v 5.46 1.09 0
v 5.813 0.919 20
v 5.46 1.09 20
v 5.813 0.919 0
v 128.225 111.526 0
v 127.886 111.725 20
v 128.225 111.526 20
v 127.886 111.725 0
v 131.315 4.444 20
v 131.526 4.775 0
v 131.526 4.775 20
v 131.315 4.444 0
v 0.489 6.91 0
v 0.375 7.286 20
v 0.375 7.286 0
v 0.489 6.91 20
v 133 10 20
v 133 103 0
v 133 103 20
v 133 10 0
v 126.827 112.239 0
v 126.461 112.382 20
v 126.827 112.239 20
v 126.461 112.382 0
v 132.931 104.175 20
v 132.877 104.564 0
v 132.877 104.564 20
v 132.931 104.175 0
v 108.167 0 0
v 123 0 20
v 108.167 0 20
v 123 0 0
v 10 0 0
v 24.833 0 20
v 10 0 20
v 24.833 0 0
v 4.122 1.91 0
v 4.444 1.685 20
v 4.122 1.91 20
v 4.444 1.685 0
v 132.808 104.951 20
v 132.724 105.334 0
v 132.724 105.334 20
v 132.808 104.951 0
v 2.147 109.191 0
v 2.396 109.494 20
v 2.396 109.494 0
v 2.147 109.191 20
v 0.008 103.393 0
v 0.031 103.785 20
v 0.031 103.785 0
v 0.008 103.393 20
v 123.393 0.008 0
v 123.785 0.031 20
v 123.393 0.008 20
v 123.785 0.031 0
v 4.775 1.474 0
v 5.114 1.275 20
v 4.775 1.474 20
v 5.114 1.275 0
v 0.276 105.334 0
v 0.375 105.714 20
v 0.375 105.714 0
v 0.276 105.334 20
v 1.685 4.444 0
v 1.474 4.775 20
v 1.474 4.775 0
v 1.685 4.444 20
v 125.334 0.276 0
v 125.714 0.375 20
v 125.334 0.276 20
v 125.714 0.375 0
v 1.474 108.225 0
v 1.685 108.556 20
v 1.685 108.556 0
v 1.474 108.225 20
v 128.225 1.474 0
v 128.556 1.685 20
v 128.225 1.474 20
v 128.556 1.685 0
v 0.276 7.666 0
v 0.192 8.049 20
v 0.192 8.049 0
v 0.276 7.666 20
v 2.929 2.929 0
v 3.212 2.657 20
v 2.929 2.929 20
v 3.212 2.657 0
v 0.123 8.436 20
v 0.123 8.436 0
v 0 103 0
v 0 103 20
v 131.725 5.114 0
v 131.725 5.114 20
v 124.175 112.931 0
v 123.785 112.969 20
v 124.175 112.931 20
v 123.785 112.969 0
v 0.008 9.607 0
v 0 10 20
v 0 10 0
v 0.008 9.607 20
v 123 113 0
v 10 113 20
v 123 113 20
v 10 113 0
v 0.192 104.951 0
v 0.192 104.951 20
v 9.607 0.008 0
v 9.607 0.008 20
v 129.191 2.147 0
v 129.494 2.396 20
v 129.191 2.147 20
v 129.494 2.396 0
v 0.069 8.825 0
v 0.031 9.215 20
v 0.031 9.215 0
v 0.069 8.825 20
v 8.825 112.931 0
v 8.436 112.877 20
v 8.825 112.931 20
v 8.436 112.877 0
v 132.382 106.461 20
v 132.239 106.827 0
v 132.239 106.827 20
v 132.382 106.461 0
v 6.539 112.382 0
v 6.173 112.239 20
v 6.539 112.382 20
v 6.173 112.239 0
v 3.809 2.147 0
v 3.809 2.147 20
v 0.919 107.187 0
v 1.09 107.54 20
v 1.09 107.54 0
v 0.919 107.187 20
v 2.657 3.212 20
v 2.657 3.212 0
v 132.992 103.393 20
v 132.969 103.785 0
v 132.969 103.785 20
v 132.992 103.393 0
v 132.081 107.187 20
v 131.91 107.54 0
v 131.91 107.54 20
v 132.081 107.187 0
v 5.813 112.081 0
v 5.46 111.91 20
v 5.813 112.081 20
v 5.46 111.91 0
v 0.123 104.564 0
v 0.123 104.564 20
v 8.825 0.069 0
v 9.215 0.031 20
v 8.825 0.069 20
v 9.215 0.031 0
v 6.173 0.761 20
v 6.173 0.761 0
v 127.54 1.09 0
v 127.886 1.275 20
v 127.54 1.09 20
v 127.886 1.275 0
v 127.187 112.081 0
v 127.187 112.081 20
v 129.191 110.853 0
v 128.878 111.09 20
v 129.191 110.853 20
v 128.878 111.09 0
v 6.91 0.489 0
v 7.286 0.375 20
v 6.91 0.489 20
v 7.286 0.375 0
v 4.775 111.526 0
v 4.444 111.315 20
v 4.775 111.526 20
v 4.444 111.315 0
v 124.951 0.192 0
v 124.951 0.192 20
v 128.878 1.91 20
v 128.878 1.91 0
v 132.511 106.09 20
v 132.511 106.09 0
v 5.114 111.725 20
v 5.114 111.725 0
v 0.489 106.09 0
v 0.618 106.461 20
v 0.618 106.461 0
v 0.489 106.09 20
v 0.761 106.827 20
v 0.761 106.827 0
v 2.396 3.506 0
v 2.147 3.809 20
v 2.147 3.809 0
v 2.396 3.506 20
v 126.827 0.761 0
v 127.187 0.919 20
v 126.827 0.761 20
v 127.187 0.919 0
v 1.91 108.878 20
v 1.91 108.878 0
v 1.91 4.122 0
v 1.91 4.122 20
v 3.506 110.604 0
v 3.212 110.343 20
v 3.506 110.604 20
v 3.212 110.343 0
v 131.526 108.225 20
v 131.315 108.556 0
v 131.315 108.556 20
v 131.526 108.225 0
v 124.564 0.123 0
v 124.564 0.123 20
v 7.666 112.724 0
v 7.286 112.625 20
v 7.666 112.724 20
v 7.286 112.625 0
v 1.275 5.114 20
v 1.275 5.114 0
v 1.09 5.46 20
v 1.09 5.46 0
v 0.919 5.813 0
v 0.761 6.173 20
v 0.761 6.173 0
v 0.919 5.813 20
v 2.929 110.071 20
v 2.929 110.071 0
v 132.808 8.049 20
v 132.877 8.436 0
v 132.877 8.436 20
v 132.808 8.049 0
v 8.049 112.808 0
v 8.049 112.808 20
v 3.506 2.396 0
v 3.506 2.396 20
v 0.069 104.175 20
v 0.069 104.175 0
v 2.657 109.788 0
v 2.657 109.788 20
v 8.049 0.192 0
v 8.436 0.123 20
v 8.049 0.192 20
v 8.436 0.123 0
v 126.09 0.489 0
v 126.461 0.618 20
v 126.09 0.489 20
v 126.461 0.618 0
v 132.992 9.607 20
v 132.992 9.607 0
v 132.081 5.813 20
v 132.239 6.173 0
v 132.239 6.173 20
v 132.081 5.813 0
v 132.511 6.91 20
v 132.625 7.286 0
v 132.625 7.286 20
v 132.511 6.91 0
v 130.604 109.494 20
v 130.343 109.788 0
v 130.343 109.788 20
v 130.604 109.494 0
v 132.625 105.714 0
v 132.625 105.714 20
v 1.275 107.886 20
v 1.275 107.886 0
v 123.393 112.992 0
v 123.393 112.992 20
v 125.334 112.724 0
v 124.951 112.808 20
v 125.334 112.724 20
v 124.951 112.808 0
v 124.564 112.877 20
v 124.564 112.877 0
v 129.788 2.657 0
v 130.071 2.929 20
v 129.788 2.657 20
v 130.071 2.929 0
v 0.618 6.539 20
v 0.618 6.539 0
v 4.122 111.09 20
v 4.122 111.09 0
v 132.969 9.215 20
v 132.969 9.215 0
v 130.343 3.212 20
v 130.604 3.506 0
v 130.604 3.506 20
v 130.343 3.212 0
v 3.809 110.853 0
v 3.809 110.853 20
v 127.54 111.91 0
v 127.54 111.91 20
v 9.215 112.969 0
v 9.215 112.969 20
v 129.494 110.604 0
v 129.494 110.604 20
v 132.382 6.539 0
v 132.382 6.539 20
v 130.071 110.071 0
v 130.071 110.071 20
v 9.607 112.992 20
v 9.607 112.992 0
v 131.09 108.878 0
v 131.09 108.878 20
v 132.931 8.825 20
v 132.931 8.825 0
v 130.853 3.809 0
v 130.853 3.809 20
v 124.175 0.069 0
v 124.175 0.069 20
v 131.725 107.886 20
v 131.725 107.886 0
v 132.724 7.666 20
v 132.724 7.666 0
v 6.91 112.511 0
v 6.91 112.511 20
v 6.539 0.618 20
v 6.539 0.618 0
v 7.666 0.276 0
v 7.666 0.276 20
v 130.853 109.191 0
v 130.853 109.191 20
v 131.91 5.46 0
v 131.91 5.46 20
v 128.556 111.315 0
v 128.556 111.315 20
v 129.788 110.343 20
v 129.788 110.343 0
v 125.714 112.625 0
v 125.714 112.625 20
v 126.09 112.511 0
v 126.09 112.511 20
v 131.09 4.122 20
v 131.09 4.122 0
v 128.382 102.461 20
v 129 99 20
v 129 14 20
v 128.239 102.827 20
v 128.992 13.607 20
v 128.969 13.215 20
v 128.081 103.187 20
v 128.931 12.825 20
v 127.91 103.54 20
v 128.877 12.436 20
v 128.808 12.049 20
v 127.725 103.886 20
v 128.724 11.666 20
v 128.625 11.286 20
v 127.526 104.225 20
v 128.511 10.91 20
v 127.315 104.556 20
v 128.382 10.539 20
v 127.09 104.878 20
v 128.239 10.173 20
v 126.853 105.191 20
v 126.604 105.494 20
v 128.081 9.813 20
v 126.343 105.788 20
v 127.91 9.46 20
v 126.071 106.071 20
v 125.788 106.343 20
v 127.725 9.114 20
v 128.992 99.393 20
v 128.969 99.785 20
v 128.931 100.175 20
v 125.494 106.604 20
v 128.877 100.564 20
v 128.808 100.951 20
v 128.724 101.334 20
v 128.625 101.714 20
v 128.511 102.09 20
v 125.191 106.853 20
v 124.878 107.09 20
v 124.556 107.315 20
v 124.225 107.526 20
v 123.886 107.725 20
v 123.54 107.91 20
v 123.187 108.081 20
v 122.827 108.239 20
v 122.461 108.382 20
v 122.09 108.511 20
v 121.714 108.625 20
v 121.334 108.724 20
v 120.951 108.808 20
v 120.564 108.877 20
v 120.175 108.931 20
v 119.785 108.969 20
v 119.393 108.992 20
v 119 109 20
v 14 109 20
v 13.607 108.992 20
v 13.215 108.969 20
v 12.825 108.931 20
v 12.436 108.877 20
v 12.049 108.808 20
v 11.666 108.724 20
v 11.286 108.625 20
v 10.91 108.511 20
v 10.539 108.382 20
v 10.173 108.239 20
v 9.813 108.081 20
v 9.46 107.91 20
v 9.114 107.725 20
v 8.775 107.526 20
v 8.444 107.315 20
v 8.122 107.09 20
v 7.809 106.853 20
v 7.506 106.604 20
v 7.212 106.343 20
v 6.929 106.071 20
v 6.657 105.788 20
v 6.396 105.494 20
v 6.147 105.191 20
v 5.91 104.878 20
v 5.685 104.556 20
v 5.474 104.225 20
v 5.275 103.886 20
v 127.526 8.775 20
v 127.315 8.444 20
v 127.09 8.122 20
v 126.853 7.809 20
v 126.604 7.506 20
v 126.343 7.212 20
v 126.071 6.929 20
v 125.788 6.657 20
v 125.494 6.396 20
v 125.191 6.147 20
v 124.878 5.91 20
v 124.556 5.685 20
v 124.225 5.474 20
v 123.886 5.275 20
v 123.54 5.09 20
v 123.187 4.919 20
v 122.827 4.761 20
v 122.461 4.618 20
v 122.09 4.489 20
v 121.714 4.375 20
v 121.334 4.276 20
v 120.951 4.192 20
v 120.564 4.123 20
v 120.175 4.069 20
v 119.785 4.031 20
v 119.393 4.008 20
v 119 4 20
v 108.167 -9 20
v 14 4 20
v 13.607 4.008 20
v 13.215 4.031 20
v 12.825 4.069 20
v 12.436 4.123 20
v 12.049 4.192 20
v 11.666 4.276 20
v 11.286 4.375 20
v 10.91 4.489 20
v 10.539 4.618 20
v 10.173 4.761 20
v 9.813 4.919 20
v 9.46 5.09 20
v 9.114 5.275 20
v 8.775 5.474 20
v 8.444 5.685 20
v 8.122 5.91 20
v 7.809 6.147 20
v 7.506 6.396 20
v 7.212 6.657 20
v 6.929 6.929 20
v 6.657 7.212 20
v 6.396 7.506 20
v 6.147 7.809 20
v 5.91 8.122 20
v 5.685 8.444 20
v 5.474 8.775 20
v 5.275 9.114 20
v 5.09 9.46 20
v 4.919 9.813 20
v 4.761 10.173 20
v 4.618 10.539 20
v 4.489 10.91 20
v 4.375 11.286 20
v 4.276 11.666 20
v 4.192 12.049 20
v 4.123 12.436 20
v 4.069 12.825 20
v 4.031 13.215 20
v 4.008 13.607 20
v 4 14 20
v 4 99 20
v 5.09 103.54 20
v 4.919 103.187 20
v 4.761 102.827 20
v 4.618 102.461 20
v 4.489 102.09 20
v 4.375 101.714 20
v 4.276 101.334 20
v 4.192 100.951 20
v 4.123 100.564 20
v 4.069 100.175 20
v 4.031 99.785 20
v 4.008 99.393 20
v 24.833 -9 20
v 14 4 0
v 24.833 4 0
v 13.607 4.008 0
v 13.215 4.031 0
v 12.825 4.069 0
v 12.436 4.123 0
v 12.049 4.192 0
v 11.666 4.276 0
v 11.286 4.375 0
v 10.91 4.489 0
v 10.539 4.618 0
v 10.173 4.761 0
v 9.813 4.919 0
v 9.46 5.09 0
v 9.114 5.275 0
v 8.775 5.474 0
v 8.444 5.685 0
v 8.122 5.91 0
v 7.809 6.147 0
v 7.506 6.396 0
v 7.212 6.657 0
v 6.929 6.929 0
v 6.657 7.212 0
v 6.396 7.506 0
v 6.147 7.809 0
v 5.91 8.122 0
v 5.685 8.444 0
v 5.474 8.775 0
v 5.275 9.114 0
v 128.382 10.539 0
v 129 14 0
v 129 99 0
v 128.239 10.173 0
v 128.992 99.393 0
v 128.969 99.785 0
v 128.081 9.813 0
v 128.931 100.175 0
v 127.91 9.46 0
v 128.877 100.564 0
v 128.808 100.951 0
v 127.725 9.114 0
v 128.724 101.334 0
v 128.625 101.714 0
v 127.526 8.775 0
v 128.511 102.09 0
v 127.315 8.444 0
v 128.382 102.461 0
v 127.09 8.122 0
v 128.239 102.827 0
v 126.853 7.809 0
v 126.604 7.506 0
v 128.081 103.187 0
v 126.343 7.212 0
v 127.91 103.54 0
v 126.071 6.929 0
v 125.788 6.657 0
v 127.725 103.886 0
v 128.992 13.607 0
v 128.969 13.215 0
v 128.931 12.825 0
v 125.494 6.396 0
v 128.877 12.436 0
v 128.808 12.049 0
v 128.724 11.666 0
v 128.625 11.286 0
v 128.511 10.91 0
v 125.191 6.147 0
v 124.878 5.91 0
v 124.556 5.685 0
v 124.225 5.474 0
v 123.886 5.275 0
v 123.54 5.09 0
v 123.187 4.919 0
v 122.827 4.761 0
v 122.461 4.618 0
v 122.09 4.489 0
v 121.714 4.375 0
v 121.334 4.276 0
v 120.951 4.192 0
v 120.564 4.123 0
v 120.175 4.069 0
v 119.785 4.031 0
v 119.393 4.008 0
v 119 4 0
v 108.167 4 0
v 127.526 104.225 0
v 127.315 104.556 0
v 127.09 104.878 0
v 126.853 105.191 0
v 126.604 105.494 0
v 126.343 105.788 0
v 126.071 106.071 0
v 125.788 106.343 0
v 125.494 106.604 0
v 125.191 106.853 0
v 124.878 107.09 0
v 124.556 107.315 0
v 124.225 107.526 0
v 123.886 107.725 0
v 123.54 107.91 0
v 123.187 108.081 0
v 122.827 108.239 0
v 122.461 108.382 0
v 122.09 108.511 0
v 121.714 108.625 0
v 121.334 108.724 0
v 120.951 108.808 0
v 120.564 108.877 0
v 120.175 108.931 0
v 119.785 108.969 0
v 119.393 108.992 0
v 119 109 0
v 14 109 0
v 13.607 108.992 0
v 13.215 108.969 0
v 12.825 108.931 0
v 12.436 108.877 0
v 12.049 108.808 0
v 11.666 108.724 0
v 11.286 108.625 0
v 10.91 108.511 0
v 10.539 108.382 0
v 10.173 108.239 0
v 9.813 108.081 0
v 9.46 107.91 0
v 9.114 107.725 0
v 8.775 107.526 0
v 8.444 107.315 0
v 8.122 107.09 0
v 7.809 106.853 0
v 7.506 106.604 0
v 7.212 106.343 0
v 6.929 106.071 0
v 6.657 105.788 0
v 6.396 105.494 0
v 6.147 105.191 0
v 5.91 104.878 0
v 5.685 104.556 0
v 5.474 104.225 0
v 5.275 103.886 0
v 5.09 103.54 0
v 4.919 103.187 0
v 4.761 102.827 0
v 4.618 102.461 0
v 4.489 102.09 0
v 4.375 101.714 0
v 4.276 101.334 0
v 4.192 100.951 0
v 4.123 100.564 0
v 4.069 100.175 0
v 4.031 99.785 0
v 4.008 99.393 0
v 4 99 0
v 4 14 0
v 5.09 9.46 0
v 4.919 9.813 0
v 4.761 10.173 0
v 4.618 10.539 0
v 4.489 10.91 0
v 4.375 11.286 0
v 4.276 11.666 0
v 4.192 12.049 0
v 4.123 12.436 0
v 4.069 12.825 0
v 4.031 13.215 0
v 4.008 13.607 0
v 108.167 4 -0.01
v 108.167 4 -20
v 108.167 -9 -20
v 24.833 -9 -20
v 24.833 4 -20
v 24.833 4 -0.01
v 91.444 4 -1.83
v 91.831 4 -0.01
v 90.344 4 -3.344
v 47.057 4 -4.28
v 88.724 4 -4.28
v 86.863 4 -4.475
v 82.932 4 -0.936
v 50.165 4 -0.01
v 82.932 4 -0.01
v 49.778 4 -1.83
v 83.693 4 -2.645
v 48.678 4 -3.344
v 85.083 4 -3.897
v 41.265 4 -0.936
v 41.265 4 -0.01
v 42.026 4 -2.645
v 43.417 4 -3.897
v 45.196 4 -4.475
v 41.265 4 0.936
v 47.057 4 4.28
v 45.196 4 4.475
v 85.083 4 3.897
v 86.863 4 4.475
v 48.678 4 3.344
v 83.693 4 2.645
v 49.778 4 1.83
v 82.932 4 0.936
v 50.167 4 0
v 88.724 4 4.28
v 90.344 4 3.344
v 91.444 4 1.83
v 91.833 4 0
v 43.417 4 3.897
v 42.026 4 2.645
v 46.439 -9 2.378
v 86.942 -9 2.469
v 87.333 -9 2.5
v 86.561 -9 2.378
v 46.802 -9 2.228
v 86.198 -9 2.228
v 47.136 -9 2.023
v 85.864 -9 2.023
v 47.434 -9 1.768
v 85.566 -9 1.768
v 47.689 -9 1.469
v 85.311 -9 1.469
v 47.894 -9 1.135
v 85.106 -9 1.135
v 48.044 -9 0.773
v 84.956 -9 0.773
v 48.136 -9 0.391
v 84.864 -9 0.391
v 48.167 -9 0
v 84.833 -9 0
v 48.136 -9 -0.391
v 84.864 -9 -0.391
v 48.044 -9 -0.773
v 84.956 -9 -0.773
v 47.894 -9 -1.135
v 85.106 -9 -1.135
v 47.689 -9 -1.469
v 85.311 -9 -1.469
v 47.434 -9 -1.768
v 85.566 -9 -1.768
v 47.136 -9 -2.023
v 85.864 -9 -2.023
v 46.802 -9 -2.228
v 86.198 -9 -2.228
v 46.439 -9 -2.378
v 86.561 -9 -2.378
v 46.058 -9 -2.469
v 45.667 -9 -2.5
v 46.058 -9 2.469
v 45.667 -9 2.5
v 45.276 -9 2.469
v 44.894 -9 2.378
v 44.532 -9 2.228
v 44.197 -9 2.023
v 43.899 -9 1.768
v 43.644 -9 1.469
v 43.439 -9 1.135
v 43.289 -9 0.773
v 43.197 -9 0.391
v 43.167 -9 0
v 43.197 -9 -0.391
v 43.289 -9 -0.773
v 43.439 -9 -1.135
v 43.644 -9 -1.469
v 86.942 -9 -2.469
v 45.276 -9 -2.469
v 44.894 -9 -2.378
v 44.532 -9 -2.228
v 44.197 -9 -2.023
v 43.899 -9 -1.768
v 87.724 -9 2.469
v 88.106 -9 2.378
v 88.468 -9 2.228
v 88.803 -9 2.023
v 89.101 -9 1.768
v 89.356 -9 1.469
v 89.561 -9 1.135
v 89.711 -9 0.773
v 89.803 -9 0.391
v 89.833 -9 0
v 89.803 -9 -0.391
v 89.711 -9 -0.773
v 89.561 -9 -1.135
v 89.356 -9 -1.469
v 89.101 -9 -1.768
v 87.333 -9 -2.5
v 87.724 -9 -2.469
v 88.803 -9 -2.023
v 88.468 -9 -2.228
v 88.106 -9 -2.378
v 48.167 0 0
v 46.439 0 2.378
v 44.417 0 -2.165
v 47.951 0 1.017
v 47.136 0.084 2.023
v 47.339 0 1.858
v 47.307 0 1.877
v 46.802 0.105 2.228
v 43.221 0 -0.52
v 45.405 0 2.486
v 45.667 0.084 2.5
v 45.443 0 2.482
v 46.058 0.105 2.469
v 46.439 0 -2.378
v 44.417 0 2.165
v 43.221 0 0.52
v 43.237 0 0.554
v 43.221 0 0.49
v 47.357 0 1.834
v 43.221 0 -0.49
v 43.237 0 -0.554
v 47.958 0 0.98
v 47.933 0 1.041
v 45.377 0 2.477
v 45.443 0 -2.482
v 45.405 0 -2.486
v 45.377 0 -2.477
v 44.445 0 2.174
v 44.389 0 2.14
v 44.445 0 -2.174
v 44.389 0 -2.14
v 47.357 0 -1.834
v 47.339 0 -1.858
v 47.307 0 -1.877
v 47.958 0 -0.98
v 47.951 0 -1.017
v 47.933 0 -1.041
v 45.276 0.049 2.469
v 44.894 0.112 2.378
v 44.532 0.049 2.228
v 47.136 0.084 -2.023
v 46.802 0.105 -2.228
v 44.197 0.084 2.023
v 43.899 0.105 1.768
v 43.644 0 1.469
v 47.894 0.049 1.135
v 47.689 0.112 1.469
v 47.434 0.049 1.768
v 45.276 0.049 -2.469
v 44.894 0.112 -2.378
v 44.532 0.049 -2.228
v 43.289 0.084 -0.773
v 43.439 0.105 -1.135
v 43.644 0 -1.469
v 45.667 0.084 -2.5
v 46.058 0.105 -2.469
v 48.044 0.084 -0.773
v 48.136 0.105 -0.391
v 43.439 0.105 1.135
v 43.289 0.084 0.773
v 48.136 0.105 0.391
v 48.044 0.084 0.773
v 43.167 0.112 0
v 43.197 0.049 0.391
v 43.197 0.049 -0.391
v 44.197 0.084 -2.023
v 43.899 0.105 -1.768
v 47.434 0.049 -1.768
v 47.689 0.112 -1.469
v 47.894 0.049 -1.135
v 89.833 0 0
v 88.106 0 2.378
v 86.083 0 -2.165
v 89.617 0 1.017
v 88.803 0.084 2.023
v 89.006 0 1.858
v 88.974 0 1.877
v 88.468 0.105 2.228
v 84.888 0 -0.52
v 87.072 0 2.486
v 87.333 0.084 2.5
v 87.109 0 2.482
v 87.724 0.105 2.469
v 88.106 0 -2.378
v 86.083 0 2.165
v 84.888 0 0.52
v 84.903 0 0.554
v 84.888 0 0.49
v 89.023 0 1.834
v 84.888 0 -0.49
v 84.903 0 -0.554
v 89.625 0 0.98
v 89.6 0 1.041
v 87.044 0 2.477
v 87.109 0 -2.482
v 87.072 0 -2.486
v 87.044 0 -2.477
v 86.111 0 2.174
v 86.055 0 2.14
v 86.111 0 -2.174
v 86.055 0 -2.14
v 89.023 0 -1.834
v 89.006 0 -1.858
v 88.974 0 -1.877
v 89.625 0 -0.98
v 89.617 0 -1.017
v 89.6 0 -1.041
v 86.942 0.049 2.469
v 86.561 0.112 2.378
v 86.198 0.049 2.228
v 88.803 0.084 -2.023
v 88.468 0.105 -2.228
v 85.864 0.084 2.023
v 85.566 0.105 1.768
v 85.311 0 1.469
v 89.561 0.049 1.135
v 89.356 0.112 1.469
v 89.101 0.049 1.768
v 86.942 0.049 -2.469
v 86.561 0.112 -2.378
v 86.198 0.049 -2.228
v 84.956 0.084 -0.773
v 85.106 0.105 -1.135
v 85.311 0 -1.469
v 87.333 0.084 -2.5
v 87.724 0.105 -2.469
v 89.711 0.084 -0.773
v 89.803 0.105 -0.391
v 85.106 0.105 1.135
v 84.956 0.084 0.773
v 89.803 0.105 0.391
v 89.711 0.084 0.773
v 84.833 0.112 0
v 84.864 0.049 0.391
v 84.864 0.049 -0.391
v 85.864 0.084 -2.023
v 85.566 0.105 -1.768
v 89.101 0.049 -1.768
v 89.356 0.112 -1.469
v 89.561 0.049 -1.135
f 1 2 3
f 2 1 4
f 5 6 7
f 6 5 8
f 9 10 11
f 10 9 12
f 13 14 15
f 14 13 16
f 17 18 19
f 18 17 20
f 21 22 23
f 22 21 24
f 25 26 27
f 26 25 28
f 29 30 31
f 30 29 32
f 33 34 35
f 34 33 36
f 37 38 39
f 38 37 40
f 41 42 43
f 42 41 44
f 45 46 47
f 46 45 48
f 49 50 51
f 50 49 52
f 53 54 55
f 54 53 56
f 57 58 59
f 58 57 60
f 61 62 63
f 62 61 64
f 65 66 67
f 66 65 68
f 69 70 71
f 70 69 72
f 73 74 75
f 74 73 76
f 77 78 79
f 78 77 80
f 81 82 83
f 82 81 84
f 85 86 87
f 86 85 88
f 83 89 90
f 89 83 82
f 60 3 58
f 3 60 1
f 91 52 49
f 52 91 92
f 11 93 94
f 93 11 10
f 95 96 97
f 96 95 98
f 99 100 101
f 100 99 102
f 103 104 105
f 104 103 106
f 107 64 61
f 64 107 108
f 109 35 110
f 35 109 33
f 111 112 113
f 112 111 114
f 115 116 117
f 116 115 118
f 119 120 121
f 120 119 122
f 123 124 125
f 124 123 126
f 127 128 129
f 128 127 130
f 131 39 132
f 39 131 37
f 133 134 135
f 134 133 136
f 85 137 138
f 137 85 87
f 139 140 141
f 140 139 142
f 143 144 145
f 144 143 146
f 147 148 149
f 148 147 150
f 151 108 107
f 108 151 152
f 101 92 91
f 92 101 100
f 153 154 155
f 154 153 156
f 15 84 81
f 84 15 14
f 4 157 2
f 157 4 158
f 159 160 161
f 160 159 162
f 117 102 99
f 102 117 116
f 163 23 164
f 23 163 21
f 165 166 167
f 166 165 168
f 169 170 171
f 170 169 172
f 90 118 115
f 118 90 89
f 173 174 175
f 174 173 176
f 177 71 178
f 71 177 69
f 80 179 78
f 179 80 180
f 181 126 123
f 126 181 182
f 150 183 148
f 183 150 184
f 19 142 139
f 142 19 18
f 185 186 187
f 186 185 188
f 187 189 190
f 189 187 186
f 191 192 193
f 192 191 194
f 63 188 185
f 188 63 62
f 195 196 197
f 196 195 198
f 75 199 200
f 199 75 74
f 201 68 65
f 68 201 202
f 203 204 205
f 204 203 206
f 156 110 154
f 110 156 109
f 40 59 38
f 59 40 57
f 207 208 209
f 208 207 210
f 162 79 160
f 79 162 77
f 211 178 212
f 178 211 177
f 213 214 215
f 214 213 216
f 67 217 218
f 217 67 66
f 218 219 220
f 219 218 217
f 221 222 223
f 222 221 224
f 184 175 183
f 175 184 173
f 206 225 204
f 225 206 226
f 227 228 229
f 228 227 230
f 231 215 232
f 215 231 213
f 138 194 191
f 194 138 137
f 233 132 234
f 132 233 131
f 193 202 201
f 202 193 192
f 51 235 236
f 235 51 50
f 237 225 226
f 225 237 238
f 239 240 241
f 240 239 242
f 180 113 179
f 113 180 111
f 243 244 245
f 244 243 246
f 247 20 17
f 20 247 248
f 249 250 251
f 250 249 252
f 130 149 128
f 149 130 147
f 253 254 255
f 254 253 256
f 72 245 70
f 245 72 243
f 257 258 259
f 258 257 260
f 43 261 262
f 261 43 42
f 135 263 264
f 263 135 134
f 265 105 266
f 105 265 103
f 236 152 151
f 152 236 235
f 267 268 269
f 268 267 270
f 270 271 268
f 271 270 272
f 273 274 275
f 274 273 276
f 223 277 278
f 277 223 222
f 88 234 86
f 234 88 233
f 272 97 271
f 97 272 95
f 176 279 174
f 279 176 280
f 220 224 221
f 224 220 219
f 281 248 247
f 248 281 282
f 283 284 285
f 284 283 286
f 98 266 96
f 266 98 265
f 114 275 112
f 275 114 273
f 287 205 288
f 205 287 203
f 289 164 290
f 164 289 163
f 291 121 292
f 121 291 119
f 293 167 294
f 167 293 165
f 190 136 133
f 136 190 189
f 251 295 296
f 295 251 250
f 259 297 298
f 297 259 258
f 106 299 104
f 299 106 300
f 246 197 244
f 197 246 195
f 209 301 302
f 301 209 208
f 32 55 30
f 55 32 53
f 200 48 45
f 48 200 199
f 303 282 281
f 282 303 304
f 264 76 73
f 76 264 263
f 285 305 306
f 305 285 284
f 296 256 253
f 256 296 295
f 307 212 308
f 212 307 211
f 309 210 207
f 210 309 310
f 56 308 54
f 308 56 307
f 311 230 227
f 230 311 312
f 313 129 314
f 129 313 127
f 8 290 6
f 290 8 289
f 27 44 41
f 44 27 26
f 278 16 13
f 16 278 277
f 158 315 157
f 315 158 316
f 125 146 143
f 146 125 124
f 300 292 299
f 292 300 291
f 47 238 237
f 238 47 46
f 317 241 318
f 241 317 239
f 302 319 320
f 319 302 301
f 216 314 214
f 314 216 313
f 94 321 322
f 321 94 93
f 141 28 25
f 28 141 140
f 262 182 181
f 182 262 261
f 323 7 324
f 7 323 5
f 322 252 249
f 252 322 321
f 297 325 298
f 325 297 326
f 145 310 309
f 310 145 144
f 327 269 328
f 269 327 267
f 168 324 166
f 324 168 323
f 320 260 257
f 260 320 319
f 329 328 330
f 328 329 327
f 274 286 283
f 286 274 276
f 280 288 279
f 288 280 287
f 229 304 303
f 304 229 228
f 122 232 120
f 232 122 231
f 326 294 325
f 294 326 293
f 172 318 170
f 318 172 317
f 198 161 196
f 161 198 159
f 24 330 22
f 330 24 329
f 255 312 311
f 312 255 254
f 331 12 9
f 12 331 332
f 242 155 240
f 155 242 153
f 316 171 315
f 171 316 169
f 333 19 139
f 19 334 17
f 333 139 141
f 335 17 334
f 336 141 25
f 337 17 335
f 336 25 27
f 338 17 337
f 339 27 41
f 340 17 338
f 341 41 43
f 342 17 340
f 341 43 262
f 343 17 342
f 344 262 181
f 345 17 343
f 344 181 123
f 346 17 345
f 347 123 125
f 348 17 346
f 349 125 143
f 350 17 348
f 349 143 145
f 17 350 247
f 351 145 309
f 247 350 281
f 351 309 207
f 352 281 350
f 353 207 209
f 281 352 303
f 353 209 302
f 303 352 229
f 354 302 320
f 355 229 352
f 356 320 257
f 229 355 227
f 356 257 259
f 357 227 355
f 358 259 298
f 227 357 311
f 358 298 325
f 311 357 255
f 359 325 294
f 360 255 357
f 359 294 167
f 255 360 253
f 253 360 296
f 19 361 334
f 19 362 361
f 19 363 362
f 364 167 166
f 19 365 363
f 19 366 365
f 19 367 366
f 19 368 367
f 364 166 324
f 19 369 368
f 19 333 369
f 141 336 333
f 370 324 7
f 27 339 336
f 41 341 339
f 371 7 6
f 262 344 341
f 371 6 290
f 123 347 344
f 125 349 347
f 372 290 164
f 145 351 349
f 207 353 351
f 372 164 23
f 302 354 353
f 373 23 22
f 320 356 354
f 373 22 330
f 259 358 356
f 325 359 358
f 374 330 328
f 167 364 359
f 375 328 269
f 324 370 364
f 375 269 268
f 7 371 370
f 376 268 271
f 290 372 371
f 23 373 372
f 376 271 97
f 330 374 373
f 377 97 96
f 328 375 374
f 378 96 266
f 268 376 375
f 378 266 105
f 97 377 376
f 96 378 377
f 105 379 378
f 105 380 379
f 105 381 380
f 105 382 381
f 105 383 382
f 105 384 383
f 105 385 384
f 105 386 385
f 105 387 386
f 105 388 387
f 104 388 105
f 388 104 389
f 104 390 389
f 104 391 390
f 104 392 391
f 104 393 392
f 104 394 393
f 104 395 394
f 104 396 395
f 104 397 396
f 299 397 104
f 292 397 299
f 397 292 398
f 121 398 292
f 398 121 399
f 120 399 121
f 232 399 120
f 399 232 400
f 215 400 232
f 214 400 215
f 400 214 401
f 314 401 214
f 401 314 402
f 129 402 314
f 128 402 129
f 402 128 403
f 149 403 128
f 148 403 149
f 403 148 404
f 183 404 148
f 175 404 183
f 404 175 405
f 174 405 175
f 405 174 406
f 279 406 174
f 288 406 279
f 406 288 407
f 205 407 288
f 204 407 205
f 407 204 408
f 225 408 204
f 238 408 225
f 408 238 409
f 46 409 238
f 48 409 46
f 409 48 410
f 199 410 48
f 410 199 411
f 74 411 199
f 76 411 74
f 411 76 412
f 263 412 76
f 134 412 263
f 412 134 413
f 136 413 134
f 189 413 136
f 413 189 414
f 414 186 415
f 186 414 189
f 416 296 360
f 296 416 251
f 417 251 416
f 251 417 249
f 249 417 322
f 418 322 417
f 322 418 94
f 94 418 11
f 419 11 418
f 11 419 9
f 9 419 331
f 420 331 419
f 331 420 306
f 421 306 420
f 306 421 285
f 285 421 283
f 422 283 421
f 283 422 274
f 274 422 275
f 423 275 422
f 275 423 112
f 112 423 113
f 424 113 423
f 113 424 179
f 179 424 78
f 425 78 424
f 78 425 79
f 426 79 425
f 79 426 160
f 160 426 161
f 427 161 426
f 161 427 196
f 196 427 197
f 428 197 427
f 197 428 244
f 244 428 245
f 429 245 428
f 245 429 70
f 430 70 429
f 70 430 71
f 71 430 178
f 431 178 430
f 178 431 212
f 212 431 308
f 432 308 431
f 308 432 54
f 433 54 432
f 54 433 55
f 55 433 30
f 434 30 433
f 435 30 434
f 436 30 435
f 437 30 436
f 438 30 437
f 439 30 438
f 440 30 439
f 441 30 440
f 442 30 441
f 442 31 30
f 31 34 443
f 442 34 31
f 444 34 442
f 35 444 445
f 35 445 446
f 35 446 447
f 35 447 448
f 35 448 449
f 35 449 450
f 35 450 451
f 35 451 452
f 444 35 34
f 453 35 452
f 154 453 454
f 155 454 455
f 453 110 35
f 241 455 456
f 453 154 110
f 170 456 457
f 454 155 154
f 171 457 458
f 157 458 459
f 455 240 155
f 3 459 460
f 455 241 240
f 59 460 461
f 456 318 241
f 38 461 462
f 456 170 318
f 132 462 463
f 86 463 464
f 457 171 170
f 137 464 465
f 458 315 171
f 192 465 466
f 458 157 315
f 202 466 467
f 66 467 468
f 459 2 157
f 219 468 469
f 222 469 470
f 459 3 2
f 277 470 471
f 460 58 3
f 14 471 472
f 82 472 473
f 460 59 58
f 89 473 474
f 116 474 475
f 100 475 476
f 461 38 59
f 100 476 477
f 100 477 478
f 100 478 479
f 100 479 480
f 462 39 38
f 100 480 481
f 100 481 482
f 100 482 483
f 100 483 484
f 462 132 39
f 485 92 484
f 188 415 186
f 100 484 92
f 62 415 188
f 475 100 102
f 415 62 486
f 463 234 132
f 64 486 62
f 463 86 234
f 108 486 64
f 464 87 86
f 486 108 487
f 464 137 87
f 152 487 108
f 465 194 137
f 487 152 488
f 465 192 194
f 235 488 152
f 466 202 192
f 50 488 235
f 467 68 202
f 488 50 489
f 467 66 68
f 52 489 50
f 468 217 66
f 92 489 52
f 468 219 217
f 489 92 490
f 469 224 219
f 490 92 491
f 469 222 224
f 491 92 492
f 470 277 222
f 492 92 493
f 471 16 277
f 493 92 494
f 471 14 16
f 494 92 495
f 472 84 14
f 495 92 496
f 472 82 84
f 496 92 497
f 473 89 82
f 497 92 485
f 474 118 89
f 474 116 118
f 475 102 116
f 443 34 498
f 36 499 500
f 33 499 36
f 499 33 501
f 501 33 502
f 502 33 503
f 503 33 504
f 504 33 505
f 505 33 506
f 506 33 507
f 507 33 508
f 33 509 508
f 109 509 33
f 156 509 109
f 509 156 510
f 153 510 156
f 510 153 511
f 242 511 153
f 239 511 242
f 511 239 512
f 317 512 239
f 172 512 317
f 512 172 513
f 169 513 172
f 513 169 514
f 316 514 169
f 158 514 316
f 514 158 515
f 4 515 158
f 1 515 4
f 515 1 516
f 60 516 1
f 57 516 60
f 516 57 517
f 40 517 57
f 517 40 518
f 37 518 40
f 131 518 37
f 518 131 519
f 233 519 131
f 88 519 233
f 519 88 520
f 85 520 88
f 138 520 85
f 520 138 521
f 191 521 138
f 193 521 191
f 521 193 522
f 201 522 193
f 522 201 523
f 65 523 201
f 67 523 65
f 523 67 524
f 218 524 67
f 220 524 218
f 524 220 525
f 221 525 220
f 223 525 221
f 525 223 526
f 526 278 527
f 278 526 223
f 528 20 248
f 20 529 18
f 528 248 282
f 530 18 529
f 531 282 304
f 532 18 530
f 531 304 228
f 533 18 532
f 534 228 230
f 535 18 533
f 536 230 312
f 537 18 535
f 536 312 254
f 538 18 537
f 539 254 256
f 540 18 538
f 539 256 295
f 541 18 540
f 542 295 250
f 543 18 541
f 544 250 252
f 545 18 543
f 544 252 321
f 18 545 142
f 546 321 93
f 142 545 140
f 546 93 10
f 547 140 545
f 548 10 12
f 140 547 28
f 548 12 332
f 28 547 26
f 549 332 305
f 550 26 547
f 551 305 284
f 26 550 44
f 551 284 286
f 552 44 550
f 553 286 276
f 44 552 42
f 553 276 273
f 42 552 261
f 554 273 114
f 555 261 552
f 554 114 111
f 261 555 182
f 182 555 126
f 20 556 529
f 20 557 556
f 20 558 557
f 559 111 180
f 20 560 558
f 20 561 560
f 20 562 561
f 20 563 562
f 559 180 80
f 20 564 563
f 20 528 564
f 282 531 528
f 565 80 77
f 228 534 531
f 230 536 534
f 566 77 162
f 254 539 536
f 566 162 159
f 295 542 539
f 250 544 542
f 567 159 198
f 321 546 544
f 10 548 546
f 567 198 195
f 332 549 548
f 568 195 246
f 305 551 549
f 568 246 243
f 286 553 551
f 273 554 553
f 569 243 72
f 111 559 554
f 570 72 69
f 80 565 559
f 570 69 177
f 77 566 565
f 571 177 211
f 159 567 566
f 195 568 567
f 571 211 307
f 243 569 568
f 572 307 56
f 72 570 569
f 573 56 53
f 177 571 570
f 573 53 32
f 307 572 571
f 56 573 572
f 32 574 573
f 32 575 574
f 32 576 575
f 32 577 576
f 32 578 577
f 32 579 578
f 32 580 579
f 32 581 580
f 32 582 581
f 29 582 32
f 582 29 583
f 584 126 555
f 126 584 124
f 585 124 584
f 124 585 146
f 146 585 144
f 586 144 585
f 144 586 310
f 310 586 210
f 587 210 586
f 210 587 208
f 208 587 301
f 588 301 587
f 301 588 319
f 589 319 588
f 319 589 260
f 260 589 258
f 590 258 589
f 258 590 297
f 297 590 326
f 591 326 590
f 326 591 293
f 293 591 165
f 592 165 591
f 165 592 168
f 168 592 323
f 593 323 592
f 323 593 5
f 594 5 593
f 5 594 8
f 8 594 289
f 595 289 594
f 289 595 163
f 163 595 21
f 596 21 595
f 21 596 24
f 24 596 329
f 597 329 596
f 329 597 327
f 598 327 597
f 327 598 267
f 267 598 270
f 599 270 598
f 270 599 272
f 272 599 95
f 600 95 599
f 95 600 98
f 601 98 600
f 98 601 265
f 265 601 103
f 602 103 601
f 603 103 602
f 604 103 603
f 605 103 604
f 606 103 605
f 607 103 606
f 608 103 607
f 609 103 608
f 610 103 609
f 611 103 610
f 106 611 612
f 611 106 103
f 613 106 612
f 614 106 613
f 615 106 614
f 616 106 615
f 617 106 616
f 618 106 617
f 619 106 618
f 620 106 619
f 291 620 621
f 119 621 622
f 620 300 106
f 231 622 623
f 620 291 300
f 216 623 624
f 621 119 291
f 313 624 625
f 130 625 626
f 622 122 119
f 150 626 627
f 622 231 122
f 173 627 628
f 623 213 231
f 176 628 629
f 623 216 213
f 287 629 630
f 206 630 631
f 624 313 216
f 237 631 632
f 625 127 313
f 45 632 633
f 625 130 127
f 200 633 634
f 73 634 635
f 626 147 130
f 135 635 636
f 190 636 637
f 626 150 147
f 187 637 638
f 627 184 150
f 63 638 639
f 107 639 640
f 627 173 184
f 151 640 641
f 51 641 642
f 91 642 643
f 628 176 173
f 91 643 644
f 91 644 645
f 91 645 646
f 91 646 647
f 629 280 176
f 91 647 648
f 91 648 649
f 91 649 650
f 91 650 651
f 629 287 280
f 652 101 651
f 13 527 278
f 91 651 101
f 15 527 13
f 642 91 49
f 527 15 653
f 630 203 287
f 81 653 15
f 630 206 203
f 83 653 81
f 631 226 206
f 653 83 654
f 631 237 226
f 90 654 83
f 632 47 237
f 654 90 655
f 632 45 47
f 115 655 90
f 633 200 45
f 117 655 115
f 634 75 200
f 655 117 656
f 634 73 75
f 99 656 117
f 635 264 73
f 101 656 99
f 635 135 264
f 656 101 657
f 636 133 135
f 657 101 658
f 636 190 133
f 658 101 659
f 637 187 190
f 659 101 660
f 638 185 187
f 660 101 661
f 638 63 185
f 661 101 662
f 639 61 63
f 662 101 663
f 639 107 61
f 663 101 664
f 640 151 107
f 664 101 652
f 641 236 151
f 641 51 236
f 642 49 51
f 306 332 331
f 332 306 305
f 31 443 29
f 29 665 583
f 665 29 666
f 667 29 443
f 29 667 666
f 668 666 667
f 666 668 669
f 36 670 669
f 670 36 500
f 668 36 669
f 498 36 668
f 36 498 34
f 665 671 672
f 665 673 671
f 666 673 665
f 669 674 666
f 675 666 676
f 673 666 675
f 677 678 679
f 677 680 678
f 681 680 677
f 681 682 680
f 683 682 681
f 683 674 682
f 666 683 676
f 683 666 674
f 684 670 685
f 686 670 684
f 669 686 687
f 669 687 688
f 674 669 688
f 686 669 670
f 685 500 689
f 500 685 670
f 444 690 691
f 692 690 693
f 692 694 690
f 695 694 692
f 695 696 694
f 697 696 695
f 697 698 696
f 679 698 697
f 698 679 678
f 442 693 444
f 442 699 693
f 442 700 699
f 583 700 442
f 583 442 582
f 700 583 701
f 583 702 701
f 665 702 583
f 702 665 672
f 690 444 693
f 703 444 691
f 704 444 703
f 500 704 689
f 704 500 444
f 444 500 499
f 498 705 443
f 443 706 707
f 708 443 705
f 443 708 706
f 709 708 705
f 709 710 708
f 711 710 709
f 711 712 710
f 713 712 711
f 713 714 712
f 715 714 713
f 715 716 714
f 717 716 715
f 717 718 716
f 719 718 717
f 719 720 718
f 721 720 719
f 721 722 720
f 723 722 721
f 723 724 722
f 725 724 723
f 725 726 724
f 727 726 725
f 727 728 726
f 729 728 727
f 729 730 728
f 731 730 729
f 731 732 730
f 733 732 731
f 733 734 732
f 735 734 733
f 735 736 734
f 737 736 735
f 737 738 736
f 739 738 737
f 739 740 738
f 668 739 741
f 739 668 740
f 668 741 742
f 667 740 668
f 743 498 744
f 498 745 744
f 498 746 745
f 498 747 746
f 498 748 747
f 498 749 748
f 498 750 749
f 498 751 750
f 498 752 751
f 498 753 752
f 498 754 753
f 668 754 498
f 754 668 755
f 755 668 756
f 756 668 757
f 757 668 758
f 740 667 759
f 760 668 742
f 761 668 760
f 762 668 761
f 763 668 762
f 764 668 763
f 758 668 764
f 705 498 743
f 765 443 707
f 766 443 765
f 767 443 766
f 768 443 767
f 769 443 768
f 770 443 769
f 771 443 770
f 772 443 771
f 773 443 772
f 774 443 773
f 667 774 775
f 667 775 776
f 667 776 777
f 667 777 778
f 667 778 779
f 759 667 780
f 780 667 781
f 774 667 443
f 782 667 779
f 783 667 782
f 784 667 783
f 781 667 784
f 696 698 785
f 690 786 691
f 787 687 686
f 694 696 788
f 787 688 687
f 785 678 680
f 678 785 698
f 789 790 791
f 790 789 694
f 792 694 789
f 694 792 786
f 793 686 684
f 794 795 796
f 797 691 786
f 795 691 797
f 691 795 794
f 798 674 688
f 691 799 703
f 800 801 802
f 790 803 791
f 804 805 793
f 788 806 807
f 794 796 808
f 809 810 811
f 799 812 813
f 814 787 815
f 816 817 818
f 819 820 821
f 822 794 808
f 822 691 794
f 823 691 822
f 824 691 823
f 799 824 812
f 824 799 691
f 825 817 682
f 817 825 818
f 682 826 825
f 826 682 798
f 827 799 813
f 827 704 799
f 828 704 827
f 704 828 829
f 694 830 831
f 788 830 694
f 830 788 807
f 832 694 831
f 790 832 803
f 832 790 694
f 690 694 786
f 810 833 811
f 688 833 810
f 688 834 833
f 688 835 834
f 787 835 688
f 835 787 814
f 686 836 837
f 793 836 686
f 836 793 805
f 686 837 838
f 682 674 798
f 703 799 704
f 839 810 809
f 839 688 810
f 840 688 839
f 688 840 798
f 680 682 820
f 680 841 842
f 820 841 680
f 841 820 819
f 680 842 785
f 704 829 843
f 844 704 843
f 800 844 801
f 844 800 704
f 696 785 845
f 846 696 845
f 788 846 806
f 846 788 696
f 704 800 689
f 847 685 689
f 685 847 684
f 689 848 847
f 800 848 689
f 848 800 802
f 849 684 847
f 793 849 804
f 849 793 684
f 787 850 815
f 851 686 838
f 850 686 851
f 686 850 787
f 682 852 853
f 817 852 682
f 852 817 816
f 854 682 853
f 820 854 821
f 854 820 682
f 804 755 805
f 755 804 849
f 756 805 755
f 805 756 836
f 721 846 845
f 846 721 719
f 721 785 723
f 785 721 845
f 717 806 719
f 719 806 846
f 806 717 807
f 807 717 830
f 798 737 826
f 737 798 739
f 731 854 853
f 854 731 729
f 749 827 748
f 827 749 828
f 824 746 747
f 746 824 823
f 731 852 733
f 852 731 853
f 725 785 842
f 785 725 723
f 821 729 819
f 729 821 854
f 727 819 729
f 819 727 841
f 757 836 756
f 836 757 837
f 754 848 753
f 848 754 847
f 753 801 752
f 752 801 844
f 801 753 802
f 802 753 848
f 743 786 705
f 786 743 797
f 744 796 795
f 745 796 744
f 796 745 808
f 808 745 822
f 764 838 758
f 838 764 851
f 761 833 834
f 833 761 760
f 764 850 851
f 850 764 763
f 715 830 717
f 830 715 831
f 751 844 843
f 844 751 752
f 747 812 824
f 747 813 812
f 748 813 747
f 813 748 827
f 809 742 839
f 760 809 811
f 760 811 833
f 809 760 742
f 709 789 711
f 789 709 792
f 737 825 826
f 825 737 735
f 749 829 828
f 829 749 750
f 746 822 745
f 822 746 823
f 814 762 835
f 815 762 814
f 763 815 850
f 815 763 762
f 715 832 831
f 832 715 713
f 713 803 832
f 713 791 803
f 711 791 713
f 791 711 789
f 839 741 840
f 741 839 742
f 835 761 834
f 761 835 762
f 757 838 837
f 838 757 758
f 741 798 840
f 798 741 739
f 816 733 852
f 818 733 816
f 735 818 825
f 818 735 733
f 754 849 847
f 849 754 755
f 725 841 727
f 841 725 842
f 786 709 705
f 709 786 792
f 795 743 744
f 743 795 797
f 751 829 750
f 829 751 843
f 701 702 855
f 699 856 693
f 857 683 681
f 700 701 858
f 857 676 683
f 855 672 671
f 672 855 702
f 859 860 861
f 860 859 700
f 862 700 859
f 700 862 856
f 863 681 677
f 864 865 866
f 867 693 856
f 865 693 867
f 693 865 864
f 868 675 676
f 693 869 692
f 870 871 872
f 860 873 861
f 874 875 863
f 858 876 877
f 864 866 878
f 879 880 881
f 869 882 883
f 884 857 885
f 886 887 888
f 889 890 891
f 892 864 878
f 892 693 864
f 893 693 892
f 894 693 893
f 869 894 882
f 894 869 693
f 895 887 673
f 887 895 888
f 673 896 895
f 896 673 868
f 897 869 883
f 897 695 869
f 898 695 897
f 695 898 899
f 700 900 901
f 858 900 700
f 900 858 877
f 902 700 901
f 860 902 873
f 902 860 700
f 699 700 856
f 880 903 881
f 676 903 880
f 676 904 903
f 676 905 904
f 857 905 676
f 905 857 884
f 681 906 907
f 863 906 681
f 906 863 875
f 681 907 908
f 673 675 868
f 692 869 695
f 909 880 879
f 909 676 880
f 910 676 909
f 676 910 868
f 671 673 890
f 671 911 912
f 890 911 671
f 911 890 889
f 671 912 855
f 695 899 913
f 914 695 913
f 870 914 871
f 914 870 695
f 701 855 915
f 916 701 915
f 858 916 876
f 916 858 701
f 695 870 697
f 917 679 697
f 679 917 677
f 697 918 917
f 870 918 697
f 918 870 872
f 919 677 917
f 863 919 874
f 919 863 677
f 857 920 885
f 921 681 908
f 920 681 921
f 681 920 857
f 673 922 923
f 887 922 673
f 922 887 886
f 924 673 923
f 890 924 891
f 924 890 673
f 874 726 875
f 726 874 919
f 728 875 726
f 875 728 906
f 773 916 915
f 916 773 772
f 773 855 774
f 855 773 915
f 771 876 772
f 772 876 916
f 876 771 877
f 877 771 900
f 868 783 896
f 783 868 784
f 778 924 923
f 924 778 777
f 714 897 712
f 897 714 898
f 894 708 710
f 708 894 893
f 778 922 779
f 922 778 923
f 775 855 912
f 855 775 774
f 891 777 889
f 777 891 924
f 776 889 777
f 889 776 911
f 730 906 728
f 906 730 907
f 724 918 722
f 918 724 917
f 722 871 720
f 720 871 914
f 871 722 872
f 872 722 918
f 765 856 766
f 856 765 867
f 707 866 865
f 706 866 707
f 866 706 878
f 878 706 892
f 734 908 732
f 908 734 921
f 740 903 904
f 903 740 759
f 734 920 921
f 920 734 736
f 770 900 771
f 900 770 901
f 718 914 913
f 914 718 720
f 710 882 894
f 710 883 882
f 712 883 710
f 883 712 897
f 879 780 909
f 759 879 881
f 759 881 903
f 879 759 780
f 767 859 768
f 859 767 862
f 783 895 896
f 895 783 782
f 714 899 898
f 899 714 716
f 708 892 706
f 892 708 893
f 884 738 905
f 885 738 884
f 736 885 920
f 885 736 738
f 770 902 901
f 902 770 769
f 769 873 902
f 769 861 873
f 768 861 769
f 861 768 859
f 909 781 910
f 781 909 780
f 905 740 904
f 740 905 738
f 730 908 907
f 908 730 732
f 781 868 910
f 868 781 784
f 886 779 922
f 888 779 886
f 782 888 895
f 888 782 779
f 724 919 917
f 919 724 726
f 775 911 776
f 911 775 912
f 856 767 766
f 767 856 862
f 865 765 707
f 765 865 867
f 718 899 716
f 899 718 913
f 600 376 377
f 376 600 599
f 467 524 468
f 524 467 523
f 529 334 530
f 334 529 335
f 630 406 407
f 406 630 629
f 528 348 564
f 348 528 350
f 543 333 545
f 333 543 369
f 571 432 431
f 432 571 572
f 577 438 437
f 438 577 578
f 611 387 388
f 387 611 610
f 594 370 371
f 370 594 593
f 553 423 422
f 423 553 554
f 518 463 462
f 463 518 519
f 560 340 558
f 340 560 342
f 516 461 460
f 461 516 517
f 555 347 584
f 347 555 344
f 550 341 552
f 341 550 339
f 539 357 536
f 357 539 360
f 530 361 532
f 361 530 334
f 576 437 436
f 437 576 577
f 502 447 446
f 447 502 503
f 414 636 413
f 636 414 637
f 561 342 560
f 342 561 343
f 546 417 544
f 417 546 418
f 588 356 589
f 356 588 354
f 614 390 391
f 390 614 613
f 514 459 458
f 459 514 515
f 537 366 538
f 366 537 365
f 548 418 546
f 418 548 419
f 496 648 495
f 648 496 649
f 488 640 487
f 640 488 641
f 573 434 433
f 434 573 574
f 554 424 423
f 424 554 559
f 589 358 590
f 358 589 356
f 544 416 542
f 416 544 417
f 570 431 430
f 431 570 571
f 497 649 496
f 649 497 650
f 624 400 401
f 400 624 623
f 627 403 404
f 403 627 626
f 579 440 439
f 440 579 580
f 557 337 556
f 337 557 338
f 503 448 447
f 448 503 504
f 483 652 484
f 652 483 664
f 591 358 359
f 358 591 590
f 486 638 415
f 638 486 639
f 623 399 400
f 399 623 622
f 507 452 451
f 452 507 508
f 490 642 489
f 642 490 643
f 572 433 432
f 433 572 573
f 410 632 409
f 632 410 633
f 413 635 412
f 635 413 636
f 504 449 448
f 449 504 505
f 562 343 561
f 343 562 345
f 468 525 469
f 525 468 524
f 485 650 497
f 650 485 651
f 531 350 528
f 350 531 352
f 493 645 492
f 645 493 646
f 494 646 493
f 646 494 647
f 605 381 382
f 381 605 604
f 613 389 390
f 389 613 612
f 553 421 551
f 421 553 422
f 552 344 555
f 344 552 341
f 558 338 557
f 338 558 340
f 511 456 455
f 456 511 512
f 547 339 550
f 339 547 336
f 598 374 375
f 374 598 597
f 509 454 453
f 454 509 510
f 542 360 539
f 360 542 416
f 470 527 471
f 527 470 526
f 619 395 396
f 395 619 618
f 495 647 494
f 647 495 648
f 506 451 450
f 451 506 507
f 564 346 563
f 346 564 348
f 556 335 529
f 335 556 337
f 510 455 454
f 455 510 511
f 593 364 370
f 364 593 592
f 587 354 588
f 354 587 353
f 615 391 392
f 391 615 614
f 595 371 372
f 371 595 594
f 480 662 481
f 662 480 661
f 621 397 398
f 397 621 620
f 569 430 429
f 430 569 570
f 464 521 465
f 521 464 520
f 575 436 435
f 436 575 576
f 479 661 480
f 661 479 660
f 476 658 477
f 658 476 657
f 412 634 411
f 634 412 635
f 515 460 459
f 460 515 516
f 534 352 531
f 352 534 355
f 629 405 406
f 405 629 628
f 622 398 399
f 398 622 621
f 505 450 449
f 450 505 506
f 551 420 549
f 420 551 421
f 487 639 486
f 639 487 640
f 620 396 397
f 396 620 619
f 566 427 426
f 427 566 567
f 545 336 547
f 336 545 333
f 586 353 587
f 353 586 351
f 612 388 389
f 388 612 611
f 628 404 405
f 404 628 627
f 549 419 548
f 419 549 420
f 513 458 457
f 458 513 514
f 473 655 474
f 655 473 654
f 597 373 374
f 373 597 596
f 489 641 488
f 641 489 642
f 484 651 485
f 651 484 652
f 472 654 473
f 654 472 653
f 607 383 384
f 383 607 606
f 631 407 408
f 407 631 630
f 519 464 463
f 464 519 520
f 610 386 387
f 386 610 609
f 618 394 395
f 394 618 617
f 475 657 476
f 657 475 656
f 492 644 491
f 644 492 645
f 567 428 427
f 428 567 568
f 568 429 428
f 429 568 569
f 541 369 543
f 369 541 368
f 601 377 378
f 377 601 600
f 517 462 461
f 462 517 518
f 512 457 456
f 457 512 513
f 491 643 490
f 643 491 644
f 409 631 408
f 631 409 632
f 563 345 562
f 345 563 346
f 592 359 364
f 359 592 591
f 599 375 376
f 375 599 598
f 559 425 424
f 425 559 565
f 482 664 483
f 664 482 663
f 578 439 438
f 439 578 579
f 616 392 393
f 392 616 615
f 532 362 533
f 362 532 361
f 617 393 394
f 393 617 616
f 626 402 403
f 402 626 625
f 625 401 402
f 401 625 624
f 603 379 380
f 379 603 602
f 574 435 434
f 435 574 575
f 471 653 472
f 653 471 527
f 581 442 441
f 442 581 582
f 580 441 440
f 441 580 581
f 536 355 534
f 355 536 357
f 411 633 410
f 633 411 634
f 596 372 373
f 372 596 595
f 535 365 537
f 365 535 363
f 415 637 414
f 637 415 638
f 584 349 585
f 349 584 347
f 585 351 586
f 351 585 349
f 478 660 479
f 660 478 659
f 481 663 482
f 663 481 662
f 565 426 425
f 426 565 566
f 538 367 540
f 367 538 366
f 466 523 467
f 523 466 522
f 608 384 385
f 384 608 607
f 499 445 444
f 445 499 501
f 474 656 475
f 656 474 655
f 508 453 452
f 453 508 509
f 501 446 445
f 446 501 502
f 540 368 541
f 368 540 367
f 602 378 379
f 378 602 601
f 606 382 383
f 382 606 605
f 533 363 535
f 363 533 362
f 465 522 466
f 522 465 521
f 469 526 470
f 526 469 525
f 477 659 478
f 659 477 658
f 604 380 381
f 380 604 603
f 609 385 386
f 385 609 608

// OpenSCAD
// file: lib.scad
module bettersphere(r) {
   sphere(r, $fn=16*r);
}

module bettercylinder(h, r) {
   cylinder(h=h, r=r, $fn=16*r);
}

module roundedcube(dims, rounding, only_sides=false) {
    if (only_sides) {
        translate([rounding, rounding, 0]) {
            minkowski() {
                bettercylinder(1, rounding);
                cube(dims - [2*rounding, 2*rounding, 1]);
            }
        }
    } else {
        translate([rounding, rounding, rounding]) {
            minkowski() {
                cube(dims - [2*rounding, 2*rounding, 2*rounding]);
                bettersphere(rounding);
            }
        }
    }
}

//roundedcube([20, 50, 30], 3, only_sides=false);

module roundedcylinder(h, r, rounding) {
    translate([0, 0, rounding]) {
        minkowski()  {
            cylinder(h = h - 2*rounding, r = r - rounding);
            bettersphere(rounding);
        }
    }
}

//roundedcylinder(50, 20, 5);

module centercube(size) {
    translate([-size/2, -size/2, -size/2]) cube(size);
}

module hollowcylinder(h, ir, or) {
    difference() {
        bettercylinder(h, or);
        
        translate([0, 0, -0.001])
        bettercylinder(h+0.002, ir);
    }
}
// main file
use <lib.scad>

length = 125;
width = 105;

wall = 4;
height = 20;
rounding = 10;

outer_length = length + wall*2;
outer_width = width + wall*2;

mount_length = length / 1.5;
mount_height = 40;
mount_thick = 13;

screw_r = 5 / 2;
screw_head_r = 9 / 2;

difference() {
    union() {
        roundedcube([outer_length, outer_width, height], rounding, true);
    
        translate([(outer_length-mount_length)/2, -mount_thick+wall, -mount_height+height])
        cube([mount_length, mount_thick, mount_height]);
    }
    
    translate([wall, wall, -.01])
    roundedcube([length, width, height+.02], rounding, true);
    
    translate([(outer_length-mount_length)/2, -mount_thick+wall, -mount_height+height]) {
        for (x = [mount_length * (1/4), mount_length * (3/4)]) {
            translate([x, mount_thick, (mount_height) / 2])
            rotate([90, 0, 0]) {
                cylinder(h=wall, r1=screw_head_r, r2=screw_r);
                bettercylinder(h=mount_thick, r=screw_r);
            }
        }
    }
}
